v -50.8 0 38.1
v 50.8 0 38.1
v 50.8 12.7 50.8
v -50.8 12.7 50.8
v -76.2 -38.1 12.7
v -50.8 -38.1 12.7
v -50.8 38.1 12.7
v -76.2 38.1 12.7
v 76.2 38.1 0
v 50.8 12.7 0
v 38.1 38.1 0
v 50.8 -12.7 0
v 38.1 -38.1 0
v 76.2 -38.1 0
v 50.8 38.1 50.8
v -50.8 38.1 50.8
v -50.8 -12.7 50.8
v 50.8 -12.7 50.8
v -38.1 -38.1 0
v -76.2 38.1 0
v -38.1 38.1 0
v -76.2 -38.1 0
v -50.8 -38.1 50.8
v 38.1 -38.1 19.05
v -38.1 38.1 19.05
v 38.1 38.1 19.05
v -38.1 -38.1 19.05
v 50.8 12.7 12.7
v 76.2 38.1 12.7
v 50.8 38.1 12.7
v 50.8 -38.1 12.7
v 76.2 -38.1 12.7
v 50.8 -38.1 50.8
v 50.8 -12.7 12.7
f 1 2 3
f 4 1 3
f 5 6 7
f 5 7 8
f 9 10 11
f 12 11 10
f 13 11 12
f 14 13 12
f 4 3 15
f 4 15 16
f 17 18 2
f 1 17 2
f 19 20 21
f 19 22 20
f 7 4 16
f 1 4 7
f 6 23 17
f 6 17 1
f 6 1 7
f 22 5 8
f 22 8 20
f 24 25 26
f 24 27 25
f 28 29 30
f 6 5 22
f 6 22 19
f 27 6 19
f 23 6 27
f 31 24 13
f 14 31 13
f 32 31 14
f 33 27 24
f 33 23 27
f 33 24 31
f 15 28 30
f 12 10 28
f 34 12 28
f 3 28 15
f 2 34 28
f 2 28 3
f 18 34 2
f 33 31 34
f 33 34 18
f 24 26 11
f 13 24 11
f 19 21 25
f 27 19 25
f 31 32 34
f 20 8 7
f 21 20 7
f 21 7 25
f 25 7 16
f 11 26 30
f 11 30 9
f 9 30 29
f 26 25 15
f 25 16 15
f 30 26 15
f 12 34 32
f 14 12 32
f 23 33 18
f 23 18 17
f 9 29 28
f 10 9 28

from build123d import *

# Parameters (mm, degrees)
F1_DEPTH = 38.1
F3_DEPTH = 12.701
F5_DEPTH = 127.001


with BuildPart() as f1:
    # F0 (on Front) → F1 (new body, symmetric)
    with BuildSketch(Plane.XZ):
        Polygon((-38.1, 19.05), (0, 19.05), (38.1, 19.05), (38.1, 0), (76.2, 0), (76.2, 12.7), (50.8, 12.7), (50.8, 50.8), (-50.8, 50.8), (-50.8, 12.7), (-76.2, 12.7), (-76.2, 0), (-38.1, 0), align=None)
    extrude(amount=F1_DEPTH, both=True)

    # F2 (on face) → F3 (cut, through all)
    with BuildSketch(Plane.XY.offset(12.7)):
        Polygon((50.8, -12.7), (76.2, -38.1), (76.2, 38.1), (50.8, 12.7), align=None)
    extrude(amount=-F3_DEPTH, mode=Mode.SUBTRACT)

    # F4 (on face) → F5 (cut, through all)
    with BuildSketch(Plane.YZ.offset(50.8)):
        Polygon((12.7, 50.8), (-12.7, 50.8), (0, 38.1), align=None)
    extrude(amount=-F5_DEPTH, mode=Mode.SUBTRACT)


solid = f1.part
